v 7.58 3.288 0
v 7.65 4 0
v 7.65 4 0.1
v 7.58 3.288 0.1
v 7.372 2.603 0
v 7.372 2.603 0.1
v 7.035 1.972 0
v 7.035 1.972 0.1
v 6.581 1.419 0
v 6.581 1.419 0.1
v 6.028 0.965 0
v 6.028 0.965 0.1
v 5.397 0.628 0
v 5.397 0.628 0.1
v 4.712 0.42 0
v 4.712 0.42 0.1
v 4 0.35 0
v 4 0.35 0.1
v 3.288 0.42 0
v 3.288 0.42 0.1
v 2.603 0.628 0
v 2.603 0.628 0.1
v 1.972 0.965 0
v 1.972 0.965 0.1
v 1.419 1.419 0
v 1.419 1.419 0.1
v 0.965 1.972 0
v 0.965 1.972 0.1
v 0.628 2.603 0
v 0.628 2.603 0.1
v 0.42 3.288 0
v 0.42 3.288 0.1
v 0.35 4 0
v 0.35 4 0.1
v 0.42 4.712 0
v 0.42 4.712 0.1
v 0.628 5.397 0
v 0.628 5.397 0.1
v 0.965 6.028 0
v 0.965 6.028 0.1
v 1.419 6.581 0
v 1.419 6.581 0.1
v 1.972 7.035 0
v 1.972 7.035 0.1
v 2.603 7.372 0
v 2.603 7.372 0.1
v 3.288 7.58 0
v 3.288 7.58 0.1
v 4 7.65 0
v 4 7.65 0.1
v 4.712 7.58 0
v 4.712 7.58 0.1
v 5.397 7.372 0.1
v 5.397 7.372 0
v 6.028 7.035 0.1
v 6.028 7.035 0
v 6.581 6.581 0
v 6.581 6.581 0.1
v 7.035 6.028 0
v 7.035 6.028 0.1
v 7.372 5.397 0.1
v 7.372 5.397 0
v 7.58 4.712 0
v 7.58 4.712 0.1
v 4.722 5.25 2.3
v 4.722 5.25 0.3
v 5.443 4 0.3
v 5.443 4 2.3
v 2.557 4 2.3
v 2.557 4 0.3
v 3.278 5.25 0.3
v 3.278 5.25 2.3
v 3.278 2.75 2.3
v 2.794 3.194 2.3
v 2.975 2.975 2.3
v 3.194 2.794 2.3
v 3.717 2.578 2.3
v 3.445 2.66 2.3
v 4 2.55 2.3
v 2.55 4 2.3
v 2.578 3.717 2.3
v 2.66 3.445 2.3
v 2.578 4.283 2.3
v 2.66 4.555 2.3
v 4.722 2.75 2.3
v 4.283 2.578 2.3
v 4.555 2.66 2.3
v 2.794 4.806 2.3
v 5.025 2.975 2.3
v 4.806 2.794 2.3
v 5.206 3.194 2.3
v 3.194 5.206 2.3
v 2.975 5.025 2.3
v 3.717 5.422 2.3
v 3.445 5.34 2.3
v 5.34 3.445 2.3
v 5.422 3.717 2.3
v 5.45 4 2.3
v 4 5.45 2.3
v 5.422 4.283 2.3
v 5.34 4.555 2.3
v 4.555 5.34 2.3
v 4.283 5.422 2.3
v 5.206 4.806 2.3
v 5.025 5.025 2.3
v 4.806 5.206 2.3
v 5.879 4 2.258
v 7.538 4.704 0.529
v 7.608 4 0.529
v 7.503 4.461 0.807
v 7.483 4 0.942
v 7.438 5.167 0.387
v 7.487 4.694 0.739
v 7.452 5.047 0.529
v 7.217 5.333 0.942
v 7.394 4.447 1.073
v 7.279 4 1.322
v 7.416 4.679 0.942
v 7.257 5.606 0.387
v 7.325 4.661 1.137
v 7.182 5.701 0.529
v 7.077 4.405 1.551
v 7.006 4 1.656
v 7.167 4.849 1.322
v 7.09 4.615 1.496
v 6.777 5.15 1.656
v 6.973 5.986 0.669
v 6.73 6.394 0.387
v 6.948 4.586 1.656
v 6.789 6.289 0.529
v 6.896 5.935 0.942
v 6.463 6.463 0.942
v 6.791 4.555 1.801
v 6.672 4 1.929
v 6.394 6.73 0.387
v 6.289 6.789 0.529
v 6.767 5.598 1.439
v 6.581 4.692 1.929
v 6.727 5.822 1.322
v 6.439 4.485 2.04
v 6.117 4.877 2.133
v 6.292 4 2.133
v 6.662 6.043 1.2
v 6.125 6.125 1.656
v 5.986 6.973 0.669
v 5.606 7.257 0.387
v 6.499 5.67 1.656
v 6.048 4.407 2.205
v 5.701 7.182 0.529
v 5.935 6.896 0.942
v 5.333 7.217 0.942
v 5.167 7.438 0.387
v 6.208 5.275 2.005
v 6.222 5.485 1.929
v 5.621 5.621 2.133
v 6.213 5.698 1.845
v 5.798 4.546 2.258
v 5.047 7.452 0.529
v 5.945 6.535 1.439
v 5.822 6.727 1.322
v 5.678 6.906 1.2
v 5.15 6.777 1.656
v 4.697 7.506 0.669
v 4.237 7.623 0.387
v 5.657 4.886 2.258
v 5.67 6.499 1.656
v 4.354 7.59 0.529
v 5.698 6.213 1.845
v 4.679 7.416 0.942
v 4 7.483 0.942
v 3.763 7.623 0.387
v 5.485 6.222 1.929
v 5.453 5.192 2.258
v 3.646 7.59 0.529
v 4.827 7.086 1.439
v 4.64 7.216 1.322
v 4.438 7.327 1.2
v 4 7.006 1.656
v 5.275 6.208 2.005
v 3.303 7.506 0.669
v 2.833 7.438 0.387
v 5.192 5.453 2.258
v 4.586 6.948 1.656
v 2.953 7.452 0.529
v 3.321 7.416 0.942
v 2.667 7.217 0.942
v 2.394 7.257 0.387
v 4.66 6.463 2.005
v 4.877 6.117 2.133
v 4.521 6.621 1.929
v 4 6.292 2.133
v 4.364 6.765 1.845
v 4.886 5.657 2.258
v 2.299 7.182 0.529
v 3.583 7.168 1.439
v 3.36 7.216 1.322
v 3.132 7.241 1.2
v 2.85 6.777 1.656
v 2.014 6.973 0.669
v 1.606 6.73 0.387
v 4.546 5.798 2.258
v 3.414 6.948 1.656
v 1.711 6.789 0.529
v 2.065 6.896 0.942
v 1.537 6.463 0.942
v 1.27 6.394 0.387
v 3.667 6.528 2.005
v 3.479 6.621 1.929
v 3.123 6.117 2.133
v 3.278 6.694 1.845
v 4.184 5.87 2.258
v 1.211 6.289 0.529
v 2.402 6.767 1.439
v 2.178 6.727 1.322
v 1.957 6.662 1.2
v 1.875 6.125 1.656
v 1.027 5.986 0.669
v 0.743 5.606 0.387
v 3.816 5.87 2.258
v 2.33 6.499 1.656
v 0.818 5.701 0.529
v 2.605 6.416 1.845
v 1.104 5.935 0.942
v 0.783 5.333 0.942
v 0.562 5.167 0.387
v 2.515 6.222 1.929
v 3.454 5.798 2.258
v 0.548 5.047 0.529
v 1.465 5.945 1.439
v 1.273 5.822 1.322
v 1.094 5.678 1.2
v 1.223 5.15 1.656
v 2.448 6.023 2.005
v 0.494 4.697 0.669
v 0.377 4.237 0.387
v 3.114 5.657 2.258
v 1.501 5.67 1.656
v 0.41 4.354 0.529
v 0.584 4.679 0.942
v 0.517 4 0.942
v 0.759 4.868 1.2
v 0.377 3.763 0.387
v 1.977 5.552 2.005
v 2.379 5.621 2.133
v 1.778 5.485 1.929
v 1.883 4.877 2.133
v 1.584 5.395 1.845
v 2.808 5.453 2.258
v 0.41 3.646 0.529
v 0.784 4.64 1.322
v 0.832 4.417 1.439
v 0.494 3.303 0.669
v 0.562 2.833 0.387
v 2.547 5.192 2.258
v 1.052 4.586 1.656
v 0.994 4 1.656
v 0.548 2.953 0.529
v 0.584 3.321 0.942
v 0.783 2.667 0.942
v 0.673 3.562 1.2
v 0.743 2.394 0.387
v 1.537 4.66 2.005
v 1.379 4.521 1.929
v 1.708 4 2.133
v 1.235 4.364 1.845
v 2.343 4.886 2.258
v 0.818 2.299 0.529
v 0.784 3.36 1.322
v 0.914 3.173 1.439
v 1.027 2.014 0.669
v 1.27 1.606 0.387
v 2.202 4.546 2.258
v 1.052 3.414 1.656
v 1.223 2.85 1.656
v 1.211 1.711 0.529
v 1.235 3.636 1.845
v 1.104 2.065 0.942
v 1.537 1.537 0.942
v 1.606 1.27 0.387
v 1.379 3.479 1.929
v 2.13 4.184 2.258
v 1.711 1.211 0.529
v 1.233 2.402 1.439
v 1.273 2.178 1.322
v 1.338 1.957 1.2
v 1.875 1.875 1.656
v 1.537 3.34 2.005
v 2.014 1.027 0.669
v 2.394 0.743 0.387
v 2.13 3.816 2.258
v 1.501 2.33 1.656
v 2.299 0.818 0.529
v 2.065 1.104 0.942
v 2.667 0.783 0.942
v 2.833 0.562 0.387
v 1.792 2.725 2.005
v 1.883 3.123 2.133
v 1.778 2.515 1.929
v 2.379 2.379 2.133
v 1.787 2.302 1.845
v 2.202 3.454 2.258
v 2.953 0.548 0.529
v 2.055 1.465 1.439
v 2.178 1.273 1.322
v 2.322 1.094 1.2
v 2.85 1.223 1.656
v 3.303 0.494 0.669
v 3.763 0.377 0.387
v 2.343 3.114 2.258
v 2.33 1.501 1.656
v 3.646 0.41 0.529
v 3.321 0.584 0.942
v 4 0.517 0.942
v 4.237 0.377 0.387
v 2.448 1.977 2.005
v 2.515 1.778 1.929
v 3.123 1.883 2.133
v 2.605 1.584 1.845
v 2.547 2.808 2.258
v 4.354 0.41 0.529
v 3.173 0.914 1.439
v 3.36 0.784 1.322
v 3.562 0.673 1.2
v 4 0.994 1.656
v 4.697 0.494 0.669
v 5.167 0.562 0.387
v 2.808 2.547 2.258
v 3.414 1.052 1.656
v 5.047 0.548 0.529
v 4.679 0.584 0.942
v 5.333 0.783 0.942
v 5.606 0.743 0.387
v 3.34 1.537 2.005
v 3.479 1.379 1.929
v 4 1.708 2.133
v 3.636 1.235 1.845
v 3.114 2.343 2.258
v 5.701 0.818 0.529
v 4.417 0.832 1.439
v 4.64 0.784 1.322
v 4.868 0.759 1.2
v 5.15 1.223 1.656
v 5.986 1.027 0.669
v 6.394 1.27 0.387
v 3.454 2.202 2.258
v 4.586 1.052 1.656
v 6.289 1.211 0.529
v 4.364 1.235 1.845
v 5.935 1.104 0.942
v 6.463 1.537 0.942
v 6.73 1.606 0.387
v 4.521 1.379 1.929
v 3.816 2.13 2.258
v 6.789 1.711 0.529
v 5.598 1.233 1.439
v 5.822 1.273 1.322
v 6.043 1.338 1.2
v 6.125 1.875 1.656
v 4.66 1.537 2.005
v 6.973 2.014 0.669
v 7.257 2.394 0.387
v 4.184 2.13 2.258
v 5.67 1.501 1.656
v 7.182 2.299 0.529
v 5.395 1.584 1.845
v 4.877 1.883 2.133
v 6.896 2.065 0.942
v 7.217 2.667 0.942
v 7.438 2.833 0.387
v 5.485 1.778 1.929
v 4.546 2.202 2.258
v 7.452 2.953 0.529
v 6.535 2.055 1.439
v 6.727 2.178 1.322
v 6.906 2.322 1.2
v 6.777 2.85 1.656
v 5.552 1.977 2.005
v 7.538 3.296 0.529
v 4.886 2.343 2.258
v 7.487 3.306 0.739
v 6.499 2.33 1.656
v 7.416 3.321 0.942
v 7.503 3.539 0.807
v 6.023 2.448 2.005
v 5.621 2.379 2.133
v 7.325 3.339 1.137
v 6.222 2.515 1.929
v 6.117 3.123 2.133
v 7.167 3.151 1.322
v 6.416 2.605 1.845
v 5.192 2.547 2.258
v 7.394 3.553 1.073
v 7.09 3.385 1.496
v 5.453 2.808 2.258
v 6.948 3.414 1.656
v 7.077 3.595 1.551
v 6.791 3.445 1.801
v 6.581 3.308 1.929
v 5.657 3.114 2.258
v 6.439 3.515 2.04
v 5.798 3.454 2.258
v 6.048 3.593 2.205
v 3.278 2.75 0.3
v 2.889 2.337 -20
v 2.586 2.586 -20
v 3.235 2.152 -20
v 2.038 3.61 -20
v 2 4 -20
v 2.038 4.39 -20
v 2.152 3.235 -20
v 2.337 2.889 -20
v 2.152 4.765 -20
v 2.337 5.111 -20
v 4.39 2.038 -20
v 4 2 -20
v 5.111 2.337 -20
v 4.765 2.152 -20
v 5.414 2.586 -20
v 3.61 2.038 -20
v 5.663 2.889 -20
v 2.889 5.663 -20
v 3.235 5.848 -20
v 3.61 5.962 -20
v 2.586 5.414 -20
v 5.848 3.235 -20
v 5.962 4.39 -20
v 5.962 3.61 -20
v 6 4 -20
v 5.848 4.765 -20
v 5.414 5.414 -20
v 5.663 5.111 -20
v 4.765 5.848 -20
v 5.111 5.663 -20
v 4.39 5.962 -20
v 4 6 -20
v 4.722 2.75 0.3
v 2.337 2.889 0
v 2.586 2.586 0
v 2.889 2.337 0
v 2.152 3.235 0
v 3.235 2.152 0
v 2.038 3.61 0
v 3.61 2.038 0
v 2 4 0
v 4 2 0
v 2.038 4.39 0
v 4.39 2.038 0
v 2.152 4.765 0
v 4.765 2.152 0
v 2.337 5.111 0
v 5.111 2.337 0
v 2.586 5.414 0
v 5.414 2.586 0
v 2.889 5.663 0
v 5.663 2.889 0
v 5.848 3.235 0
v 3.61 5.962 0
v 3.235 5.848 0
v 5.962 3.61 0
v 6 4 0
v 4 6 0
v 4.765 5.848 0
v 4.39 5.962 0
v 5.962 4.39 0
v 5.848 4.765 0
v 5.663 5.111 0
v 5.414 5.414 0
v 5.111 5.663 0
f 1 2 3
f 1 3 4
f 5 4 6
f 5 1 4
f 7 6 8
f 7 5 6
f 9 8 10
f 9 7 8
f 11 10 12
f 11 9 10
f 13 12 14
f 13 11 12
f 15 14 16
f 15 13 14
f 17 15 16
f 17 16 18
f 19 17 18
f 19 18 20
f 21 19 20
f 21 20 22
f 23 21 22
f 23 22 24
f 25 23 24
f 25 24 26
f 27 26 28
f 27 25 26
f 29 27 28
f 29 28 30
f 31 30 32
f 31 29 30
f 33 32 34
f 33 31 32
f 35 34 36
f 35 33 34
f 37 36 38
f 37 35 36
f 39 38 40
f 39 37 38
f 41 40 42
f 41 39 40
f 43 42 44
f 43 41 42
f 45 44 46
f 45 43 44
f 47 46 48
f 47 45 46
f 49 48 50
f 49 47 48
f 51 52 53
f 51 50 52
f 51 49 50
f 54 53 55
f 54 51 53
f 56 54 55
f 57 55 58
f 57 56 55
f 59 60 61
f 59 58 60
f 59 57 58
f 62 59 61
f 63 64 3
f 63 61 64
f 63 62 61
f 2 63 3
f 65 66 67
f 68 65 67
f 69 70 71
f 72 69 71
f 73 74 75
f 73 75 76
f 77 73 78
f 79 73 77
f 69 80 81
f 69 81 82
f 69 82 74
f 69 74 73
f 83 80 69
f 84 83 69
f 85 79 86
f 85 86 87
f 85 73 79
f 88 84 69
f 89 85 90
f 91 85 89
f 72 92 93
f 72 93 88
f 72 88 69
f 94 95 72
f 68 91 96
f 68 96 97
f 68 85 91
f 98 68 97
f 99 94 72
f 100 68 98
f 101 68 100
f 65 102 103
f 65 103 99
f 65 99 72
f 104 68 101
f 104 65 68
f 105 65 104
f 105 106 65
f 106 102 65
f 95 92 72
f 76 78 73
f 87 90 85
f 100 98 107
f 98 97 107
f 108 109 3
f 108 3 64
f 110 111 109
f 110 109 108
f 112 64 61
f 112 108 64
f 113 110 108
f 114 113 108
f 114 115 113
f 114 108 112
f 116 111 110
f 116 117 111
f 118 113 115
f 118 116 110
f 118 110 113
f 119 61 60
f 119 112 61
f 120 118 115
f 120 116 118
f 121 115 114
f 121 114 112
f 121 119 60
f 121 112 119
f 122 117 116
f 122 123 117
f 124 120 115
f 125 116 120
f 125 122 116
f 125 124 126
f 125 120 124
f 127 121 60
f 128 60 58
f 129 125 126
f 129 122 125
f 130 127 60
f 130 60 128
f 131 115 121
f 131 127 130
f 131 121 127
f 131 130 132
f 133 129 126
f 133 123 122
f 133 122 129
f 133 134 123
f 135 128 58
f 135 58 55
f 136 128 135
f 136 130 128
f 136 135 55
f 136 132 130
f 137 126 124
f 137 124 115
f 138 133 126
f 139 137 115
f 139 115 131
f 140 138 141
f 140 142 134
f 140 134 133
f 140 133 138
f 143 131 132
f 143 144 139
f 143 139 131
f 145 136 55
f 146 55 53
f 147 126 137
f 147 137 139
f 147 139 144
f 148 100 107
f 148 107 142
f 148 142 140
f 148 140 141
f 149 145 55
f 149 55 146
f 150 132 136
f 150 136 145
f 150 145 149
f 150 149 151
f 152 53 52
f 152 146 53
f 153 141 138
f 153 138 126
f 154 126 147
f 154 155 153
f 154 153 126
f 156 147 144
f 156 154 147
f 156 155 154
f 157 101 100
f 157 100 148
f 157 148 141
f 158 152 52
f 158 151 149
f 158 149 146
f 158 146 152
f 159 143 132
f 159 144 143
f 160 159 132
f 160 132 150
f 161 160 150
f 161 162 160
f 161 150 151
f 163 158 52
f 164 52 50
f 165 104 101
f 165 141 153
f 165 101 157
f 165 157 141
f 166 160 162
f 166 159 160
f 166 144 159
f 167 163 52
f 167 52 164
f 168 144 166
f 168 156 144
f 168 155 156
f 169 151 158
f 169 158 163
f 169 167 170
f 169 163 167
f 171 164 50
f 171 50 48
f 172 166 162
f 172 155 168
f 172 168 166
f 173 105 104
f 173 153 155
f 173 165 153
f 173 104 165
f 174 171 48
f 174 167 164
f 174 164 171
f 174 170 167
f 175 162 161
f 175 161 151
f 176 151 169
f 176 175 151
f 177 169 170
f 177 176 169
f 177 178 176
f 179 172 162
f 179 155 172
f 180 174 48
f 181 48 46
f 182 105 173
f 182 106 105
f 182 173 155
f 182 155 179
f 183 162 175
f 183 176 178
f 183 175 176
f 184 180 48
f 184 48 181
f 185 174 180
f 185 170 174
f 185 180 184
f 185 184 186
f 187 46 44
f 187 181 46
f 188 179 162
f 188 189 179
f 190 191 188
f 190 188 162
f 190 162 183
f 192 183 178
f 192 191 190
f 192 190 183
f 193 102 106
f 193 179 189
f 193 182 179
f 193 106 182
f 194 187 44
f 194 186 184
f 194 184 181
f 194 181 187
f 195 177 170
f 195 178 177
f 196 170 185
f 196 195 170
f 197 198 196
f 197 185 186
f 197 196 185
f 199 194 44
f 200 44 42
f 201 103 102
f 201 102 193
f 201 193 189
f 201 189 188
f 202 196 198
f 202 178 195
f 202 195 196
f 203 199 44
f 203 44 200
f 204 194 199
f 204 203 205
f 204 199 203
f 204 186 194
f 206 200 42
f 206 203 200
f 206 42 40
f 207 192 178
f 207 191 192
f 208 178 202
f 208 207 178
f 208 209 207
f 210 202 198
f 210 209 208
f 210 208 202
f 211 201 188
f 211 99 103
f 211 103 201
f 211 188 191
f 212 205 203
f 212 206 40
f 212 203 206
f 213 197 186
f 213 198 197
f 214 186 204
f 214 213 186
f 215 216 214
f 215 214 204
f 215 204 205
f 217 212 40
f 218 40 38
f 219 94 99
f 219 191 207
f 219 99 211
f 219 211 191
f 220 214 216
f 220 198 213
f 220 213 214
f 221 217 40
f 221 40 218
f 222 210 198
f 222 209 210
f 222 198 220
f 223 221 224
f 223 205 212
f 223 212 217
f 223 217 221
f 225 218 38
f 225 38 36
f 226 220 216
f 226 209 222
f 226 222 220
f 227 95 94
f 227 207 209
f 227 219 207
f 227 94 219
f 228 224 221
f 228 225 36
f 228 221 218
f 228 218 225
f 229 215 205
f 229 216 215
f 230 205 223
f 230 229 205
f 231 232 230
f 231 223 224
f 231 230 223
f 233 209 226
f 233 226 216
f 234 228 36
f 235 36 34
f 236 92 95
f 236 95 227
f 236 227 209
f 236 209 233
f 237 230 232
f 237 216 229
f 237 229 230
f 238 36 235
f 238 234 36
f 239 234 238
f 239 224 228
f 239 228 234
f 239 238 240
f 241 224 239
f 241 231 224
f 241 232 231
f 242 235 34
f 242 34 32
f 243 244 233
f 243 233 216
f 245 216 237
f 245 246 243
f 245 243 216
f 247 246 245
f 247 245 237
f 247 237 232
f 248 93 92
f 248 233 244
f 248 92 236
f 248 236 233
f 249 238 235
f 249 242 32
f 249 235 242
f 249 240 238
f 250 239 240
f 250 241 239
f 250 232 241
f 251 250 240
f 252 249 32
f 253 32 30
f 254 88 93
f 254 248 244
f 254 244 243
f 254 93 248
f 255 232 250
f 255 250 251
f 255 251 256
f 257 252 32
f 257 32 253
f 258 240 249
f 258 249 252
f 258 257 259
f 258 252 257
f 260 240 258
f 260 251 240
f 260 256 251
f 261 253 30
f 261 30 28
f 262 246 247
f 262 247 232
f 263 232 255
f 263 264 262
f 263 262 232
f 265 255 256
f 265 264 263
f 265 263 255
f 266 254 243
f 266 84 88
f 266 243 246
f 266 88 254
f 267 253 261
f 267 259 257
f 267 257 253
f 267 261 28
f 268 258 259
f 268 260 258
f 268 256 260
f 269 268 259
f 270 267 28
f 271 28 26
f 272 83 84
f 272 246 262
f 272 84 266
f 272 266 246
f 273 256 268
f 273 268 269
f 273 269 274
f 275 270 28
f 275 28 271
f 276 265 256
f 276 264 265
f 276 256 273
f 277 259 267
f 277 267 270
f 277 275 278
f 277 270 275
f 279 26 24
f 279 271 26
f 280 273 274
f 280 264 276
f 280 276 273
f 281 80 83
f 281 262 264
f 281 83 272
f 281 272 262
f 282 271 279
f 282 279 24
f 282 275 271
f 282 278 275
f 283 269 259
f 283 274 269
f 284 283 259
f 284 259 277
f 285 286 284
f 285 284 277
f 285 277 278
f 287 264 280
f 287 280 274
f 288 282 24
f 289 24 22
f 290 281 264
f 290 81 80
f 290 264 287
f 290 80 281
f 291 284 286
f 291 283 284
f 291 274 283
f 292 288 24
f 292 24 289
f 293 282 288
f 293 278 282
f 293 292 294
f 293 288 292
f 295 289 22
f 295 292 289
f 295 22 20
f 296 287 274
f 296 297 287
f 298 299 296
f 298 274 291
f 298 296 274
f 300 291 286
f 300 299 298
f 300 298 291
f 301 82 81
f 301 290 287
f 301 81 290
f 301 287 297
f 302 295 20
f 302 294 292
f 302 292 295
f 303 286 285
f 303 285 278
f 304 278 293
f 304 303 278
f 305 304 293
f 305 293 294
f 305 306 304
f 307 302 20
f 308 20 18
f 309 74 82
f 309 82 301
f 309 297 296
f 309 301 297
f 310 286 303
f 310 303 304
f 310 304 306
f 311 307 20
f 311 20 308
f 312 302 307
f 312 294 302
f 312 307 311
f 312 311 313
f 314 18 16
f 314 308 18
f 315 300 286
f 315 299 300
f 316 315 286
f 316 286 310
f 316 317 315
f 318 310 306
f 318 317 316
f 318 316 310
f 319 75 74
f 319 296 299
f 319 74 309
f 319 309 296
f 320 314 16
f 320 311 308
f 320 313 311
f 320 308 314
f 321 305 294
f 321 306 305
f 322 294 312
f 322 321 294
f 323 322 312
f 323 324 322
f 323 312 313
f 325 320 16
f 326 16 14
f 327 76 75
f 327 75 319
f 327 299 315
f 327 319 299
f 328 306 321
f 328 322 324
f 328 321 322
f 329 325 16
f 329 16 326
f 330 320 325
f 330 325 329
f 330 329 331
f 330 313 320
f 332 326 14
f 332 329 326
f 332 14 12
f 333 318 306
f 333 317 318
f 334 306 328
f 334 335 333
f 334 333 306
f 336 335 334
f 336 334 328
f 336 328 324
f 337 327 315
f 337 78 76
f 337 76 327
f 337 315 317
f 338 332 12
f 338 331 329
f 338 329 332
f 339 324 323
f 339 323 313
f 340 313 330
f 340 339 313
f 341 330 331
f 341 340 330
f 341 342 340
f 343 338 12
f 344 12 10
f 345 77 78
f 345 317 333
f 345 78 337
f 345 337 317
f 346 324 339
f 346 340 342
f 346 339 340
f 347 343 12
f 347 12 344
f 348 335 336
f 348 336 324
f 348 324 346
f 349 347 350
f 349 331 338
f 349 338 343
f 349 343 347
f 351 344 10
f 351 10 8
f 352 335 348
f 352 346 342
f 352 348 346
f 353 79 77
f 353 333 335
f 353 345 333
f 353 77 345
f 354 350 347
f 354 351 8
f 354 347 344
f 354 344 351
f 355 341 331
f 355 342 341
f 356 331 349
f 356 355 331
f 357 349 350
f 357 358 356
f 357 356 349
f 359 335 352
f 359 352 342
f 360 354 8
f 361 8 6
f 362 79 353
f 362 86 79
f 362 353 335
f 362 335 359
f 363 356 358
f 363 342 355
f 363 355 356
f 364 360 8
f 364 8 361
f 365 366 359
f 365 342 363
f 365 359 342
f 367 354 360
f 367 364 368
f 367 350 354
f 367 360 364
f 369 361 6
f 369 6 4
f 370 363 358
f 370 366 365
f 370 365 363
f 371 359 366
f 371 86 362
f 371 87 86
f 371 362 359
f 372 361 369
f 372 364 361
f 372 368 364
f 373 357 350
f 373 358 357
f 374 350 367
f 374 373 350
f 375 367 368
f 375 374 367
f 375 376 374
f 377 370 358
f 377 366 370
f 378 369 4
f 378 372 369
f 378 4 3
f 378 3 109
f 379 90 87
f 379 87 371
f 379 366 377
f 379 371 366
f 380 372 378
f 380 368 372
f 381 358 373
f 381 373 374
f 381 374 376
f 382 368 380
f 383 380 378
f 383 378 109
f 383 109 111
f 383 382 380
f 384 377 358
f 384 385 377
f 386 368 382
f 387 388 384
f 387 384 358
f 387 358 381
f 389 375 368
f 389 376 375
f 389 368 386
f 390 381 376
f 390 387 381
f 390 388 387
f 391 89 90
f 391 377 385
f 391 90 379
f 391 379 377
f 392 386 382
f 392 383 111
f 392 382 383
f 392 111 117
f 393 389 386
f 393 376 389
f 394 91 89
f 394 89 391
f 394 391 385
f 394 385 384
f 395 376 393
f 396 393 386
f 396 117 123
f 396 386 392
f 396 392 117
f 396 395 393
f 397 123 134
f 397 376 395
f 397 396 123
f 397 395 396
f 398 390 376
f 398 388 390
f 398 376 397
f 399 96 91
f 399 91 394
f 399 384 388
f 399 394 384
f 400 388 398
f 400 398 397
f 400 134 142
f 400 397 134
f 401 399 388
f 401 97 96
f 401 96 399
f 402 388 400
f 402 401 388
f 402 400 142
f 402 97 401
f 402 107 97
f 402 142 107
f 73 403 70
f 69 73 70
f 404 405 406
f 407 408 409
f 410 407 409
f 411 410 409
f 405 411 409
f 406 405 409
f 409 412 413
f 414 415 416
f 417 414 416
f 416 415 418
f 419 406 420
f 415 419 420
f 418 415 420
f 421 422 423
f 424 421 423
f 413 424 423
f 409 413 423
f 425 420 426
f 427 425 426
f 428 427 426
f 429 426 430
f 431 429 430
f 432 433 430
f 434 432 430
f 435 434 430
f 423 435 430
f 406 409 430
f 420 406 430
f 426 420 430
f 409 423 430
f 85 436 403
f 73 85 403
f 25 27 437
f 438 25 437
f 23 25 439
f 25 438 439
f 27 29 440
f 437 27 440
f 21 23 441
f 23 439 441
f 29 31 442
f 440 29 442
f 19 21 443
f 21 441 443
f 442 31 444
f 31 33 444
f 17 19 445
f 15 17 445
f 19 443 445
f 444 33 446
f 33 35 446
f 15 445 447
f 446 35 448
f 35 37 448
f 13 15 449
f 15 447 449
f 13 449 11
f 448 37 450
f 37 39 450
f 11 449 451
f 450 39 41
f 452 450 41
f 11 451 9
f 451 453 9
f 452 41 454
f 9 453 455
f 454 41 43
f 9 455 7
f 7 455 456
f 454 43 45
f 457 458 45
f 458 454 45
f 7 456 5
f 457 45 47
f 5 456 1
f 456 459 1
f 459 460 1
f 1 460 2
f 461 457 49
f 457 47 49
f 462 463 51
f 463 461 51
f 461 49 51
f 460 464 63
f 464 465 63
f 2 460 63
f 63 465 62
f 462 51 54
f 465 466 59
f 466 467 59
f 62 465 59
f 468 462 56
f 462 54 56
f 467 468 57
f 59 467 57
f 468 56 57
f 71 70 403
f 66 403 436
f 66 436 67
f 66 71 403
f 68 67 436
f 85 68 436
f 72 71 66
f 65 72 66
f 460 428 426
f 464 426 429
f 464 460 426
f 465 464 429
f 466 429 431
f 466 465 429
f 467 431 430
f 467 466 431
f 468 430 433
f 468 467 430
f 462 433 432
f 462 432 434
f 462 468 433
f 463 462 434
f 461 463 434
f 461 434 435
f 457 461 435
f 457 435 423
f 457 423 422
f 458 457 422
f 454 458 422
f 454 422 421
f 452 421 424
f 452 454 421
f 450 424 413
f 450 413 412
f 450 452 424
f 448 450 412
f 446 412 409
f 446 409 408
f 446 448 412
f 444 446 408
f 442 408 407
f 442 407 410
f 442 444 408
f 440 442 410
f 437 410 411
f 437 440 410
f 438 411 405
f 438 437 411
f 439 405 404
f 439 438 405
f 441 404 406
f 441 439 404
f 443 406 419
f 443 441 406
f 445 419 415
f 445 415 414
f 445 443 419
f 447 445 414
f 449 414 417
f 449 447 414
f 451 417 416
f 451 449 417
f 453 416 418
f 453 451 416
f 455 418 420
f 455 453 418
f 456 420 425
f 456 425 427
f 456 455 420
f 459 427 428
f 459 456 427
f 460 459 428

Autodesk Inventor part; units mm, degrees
ref_plane "YZ Plane" through (0, 0, 0) normal (1, 0, 0) x (0, 1, 0)
ref_plane "XZ Plane" through (0, 0, 0) normal (0, 1, 0) x (-1, 0, 0)
ref_plane "XY Plane" through (0, 0, 0) normal (0, 0, 1) x (1, 0, 0)
sketch "Sketch1" plane through (0, 0, 0) normal (0, 0, 1) x (1, 0, 0)
  circle A0 centre (4, 4) radius 1.2 projected
  circle A1 centre (4, 4) radius 2
  point P0 (0, 0)
  dimension "d0" = 4
extrude "Extrusion1" add sketch "Sketch1" against normal blind 20 contours A0 | A1
sketch "Sketch2" plane through (4, 4, 0) normal (0, 0, 1) x (1, 0, 0)
  circle A0 centre (0, 0) radius 2 projected
  circle A1 centre (0, 0) radius 3.65
  point P0 (-4, -4)
  dimension "d3" = 7.3
extrude "Extrusion2" add sketch "Sketch2" along normal blind 2.3 contours A0 | A1
fillet "Fillet1" radius 2.2 1 edges at (0.35, 4, 2.3)
sketch "Sketch4" plane through (4, 4, 2.3) normal (0, 0, 1) x (1, 0, 0)
  circle A0 centre (0, 0) radius 1.45 projected
  line L0 (0.7217, 1.25) -> (1.4434, 0)
  line L1 (1.4434, 0) -> (0.7217, -1.25)
  line L2 (0.7217, -1.25) -> (-0.7217, -1.25)
  line L3 (-0.7217, -1.25) -> (-1.4434, 0)
  line L4 (-1.4434, 0) -> (-0.7217, 1.25)
  line L5 (-0.7217, 1.25) -> (0.7217, 1.25)
  point P0 (-4, -4)
  dimension "d10" = 2.5
extrude "Extrusion4" cut sketch "Sketch4" along normal mid plane 4 contours L0 L1 L2 L3 L4 L5
thread "Thread1" size "M3x0.5" class "6g" standard "ANSI Metric M Profile" full length
properties part number "m3 6" material "Steel"
